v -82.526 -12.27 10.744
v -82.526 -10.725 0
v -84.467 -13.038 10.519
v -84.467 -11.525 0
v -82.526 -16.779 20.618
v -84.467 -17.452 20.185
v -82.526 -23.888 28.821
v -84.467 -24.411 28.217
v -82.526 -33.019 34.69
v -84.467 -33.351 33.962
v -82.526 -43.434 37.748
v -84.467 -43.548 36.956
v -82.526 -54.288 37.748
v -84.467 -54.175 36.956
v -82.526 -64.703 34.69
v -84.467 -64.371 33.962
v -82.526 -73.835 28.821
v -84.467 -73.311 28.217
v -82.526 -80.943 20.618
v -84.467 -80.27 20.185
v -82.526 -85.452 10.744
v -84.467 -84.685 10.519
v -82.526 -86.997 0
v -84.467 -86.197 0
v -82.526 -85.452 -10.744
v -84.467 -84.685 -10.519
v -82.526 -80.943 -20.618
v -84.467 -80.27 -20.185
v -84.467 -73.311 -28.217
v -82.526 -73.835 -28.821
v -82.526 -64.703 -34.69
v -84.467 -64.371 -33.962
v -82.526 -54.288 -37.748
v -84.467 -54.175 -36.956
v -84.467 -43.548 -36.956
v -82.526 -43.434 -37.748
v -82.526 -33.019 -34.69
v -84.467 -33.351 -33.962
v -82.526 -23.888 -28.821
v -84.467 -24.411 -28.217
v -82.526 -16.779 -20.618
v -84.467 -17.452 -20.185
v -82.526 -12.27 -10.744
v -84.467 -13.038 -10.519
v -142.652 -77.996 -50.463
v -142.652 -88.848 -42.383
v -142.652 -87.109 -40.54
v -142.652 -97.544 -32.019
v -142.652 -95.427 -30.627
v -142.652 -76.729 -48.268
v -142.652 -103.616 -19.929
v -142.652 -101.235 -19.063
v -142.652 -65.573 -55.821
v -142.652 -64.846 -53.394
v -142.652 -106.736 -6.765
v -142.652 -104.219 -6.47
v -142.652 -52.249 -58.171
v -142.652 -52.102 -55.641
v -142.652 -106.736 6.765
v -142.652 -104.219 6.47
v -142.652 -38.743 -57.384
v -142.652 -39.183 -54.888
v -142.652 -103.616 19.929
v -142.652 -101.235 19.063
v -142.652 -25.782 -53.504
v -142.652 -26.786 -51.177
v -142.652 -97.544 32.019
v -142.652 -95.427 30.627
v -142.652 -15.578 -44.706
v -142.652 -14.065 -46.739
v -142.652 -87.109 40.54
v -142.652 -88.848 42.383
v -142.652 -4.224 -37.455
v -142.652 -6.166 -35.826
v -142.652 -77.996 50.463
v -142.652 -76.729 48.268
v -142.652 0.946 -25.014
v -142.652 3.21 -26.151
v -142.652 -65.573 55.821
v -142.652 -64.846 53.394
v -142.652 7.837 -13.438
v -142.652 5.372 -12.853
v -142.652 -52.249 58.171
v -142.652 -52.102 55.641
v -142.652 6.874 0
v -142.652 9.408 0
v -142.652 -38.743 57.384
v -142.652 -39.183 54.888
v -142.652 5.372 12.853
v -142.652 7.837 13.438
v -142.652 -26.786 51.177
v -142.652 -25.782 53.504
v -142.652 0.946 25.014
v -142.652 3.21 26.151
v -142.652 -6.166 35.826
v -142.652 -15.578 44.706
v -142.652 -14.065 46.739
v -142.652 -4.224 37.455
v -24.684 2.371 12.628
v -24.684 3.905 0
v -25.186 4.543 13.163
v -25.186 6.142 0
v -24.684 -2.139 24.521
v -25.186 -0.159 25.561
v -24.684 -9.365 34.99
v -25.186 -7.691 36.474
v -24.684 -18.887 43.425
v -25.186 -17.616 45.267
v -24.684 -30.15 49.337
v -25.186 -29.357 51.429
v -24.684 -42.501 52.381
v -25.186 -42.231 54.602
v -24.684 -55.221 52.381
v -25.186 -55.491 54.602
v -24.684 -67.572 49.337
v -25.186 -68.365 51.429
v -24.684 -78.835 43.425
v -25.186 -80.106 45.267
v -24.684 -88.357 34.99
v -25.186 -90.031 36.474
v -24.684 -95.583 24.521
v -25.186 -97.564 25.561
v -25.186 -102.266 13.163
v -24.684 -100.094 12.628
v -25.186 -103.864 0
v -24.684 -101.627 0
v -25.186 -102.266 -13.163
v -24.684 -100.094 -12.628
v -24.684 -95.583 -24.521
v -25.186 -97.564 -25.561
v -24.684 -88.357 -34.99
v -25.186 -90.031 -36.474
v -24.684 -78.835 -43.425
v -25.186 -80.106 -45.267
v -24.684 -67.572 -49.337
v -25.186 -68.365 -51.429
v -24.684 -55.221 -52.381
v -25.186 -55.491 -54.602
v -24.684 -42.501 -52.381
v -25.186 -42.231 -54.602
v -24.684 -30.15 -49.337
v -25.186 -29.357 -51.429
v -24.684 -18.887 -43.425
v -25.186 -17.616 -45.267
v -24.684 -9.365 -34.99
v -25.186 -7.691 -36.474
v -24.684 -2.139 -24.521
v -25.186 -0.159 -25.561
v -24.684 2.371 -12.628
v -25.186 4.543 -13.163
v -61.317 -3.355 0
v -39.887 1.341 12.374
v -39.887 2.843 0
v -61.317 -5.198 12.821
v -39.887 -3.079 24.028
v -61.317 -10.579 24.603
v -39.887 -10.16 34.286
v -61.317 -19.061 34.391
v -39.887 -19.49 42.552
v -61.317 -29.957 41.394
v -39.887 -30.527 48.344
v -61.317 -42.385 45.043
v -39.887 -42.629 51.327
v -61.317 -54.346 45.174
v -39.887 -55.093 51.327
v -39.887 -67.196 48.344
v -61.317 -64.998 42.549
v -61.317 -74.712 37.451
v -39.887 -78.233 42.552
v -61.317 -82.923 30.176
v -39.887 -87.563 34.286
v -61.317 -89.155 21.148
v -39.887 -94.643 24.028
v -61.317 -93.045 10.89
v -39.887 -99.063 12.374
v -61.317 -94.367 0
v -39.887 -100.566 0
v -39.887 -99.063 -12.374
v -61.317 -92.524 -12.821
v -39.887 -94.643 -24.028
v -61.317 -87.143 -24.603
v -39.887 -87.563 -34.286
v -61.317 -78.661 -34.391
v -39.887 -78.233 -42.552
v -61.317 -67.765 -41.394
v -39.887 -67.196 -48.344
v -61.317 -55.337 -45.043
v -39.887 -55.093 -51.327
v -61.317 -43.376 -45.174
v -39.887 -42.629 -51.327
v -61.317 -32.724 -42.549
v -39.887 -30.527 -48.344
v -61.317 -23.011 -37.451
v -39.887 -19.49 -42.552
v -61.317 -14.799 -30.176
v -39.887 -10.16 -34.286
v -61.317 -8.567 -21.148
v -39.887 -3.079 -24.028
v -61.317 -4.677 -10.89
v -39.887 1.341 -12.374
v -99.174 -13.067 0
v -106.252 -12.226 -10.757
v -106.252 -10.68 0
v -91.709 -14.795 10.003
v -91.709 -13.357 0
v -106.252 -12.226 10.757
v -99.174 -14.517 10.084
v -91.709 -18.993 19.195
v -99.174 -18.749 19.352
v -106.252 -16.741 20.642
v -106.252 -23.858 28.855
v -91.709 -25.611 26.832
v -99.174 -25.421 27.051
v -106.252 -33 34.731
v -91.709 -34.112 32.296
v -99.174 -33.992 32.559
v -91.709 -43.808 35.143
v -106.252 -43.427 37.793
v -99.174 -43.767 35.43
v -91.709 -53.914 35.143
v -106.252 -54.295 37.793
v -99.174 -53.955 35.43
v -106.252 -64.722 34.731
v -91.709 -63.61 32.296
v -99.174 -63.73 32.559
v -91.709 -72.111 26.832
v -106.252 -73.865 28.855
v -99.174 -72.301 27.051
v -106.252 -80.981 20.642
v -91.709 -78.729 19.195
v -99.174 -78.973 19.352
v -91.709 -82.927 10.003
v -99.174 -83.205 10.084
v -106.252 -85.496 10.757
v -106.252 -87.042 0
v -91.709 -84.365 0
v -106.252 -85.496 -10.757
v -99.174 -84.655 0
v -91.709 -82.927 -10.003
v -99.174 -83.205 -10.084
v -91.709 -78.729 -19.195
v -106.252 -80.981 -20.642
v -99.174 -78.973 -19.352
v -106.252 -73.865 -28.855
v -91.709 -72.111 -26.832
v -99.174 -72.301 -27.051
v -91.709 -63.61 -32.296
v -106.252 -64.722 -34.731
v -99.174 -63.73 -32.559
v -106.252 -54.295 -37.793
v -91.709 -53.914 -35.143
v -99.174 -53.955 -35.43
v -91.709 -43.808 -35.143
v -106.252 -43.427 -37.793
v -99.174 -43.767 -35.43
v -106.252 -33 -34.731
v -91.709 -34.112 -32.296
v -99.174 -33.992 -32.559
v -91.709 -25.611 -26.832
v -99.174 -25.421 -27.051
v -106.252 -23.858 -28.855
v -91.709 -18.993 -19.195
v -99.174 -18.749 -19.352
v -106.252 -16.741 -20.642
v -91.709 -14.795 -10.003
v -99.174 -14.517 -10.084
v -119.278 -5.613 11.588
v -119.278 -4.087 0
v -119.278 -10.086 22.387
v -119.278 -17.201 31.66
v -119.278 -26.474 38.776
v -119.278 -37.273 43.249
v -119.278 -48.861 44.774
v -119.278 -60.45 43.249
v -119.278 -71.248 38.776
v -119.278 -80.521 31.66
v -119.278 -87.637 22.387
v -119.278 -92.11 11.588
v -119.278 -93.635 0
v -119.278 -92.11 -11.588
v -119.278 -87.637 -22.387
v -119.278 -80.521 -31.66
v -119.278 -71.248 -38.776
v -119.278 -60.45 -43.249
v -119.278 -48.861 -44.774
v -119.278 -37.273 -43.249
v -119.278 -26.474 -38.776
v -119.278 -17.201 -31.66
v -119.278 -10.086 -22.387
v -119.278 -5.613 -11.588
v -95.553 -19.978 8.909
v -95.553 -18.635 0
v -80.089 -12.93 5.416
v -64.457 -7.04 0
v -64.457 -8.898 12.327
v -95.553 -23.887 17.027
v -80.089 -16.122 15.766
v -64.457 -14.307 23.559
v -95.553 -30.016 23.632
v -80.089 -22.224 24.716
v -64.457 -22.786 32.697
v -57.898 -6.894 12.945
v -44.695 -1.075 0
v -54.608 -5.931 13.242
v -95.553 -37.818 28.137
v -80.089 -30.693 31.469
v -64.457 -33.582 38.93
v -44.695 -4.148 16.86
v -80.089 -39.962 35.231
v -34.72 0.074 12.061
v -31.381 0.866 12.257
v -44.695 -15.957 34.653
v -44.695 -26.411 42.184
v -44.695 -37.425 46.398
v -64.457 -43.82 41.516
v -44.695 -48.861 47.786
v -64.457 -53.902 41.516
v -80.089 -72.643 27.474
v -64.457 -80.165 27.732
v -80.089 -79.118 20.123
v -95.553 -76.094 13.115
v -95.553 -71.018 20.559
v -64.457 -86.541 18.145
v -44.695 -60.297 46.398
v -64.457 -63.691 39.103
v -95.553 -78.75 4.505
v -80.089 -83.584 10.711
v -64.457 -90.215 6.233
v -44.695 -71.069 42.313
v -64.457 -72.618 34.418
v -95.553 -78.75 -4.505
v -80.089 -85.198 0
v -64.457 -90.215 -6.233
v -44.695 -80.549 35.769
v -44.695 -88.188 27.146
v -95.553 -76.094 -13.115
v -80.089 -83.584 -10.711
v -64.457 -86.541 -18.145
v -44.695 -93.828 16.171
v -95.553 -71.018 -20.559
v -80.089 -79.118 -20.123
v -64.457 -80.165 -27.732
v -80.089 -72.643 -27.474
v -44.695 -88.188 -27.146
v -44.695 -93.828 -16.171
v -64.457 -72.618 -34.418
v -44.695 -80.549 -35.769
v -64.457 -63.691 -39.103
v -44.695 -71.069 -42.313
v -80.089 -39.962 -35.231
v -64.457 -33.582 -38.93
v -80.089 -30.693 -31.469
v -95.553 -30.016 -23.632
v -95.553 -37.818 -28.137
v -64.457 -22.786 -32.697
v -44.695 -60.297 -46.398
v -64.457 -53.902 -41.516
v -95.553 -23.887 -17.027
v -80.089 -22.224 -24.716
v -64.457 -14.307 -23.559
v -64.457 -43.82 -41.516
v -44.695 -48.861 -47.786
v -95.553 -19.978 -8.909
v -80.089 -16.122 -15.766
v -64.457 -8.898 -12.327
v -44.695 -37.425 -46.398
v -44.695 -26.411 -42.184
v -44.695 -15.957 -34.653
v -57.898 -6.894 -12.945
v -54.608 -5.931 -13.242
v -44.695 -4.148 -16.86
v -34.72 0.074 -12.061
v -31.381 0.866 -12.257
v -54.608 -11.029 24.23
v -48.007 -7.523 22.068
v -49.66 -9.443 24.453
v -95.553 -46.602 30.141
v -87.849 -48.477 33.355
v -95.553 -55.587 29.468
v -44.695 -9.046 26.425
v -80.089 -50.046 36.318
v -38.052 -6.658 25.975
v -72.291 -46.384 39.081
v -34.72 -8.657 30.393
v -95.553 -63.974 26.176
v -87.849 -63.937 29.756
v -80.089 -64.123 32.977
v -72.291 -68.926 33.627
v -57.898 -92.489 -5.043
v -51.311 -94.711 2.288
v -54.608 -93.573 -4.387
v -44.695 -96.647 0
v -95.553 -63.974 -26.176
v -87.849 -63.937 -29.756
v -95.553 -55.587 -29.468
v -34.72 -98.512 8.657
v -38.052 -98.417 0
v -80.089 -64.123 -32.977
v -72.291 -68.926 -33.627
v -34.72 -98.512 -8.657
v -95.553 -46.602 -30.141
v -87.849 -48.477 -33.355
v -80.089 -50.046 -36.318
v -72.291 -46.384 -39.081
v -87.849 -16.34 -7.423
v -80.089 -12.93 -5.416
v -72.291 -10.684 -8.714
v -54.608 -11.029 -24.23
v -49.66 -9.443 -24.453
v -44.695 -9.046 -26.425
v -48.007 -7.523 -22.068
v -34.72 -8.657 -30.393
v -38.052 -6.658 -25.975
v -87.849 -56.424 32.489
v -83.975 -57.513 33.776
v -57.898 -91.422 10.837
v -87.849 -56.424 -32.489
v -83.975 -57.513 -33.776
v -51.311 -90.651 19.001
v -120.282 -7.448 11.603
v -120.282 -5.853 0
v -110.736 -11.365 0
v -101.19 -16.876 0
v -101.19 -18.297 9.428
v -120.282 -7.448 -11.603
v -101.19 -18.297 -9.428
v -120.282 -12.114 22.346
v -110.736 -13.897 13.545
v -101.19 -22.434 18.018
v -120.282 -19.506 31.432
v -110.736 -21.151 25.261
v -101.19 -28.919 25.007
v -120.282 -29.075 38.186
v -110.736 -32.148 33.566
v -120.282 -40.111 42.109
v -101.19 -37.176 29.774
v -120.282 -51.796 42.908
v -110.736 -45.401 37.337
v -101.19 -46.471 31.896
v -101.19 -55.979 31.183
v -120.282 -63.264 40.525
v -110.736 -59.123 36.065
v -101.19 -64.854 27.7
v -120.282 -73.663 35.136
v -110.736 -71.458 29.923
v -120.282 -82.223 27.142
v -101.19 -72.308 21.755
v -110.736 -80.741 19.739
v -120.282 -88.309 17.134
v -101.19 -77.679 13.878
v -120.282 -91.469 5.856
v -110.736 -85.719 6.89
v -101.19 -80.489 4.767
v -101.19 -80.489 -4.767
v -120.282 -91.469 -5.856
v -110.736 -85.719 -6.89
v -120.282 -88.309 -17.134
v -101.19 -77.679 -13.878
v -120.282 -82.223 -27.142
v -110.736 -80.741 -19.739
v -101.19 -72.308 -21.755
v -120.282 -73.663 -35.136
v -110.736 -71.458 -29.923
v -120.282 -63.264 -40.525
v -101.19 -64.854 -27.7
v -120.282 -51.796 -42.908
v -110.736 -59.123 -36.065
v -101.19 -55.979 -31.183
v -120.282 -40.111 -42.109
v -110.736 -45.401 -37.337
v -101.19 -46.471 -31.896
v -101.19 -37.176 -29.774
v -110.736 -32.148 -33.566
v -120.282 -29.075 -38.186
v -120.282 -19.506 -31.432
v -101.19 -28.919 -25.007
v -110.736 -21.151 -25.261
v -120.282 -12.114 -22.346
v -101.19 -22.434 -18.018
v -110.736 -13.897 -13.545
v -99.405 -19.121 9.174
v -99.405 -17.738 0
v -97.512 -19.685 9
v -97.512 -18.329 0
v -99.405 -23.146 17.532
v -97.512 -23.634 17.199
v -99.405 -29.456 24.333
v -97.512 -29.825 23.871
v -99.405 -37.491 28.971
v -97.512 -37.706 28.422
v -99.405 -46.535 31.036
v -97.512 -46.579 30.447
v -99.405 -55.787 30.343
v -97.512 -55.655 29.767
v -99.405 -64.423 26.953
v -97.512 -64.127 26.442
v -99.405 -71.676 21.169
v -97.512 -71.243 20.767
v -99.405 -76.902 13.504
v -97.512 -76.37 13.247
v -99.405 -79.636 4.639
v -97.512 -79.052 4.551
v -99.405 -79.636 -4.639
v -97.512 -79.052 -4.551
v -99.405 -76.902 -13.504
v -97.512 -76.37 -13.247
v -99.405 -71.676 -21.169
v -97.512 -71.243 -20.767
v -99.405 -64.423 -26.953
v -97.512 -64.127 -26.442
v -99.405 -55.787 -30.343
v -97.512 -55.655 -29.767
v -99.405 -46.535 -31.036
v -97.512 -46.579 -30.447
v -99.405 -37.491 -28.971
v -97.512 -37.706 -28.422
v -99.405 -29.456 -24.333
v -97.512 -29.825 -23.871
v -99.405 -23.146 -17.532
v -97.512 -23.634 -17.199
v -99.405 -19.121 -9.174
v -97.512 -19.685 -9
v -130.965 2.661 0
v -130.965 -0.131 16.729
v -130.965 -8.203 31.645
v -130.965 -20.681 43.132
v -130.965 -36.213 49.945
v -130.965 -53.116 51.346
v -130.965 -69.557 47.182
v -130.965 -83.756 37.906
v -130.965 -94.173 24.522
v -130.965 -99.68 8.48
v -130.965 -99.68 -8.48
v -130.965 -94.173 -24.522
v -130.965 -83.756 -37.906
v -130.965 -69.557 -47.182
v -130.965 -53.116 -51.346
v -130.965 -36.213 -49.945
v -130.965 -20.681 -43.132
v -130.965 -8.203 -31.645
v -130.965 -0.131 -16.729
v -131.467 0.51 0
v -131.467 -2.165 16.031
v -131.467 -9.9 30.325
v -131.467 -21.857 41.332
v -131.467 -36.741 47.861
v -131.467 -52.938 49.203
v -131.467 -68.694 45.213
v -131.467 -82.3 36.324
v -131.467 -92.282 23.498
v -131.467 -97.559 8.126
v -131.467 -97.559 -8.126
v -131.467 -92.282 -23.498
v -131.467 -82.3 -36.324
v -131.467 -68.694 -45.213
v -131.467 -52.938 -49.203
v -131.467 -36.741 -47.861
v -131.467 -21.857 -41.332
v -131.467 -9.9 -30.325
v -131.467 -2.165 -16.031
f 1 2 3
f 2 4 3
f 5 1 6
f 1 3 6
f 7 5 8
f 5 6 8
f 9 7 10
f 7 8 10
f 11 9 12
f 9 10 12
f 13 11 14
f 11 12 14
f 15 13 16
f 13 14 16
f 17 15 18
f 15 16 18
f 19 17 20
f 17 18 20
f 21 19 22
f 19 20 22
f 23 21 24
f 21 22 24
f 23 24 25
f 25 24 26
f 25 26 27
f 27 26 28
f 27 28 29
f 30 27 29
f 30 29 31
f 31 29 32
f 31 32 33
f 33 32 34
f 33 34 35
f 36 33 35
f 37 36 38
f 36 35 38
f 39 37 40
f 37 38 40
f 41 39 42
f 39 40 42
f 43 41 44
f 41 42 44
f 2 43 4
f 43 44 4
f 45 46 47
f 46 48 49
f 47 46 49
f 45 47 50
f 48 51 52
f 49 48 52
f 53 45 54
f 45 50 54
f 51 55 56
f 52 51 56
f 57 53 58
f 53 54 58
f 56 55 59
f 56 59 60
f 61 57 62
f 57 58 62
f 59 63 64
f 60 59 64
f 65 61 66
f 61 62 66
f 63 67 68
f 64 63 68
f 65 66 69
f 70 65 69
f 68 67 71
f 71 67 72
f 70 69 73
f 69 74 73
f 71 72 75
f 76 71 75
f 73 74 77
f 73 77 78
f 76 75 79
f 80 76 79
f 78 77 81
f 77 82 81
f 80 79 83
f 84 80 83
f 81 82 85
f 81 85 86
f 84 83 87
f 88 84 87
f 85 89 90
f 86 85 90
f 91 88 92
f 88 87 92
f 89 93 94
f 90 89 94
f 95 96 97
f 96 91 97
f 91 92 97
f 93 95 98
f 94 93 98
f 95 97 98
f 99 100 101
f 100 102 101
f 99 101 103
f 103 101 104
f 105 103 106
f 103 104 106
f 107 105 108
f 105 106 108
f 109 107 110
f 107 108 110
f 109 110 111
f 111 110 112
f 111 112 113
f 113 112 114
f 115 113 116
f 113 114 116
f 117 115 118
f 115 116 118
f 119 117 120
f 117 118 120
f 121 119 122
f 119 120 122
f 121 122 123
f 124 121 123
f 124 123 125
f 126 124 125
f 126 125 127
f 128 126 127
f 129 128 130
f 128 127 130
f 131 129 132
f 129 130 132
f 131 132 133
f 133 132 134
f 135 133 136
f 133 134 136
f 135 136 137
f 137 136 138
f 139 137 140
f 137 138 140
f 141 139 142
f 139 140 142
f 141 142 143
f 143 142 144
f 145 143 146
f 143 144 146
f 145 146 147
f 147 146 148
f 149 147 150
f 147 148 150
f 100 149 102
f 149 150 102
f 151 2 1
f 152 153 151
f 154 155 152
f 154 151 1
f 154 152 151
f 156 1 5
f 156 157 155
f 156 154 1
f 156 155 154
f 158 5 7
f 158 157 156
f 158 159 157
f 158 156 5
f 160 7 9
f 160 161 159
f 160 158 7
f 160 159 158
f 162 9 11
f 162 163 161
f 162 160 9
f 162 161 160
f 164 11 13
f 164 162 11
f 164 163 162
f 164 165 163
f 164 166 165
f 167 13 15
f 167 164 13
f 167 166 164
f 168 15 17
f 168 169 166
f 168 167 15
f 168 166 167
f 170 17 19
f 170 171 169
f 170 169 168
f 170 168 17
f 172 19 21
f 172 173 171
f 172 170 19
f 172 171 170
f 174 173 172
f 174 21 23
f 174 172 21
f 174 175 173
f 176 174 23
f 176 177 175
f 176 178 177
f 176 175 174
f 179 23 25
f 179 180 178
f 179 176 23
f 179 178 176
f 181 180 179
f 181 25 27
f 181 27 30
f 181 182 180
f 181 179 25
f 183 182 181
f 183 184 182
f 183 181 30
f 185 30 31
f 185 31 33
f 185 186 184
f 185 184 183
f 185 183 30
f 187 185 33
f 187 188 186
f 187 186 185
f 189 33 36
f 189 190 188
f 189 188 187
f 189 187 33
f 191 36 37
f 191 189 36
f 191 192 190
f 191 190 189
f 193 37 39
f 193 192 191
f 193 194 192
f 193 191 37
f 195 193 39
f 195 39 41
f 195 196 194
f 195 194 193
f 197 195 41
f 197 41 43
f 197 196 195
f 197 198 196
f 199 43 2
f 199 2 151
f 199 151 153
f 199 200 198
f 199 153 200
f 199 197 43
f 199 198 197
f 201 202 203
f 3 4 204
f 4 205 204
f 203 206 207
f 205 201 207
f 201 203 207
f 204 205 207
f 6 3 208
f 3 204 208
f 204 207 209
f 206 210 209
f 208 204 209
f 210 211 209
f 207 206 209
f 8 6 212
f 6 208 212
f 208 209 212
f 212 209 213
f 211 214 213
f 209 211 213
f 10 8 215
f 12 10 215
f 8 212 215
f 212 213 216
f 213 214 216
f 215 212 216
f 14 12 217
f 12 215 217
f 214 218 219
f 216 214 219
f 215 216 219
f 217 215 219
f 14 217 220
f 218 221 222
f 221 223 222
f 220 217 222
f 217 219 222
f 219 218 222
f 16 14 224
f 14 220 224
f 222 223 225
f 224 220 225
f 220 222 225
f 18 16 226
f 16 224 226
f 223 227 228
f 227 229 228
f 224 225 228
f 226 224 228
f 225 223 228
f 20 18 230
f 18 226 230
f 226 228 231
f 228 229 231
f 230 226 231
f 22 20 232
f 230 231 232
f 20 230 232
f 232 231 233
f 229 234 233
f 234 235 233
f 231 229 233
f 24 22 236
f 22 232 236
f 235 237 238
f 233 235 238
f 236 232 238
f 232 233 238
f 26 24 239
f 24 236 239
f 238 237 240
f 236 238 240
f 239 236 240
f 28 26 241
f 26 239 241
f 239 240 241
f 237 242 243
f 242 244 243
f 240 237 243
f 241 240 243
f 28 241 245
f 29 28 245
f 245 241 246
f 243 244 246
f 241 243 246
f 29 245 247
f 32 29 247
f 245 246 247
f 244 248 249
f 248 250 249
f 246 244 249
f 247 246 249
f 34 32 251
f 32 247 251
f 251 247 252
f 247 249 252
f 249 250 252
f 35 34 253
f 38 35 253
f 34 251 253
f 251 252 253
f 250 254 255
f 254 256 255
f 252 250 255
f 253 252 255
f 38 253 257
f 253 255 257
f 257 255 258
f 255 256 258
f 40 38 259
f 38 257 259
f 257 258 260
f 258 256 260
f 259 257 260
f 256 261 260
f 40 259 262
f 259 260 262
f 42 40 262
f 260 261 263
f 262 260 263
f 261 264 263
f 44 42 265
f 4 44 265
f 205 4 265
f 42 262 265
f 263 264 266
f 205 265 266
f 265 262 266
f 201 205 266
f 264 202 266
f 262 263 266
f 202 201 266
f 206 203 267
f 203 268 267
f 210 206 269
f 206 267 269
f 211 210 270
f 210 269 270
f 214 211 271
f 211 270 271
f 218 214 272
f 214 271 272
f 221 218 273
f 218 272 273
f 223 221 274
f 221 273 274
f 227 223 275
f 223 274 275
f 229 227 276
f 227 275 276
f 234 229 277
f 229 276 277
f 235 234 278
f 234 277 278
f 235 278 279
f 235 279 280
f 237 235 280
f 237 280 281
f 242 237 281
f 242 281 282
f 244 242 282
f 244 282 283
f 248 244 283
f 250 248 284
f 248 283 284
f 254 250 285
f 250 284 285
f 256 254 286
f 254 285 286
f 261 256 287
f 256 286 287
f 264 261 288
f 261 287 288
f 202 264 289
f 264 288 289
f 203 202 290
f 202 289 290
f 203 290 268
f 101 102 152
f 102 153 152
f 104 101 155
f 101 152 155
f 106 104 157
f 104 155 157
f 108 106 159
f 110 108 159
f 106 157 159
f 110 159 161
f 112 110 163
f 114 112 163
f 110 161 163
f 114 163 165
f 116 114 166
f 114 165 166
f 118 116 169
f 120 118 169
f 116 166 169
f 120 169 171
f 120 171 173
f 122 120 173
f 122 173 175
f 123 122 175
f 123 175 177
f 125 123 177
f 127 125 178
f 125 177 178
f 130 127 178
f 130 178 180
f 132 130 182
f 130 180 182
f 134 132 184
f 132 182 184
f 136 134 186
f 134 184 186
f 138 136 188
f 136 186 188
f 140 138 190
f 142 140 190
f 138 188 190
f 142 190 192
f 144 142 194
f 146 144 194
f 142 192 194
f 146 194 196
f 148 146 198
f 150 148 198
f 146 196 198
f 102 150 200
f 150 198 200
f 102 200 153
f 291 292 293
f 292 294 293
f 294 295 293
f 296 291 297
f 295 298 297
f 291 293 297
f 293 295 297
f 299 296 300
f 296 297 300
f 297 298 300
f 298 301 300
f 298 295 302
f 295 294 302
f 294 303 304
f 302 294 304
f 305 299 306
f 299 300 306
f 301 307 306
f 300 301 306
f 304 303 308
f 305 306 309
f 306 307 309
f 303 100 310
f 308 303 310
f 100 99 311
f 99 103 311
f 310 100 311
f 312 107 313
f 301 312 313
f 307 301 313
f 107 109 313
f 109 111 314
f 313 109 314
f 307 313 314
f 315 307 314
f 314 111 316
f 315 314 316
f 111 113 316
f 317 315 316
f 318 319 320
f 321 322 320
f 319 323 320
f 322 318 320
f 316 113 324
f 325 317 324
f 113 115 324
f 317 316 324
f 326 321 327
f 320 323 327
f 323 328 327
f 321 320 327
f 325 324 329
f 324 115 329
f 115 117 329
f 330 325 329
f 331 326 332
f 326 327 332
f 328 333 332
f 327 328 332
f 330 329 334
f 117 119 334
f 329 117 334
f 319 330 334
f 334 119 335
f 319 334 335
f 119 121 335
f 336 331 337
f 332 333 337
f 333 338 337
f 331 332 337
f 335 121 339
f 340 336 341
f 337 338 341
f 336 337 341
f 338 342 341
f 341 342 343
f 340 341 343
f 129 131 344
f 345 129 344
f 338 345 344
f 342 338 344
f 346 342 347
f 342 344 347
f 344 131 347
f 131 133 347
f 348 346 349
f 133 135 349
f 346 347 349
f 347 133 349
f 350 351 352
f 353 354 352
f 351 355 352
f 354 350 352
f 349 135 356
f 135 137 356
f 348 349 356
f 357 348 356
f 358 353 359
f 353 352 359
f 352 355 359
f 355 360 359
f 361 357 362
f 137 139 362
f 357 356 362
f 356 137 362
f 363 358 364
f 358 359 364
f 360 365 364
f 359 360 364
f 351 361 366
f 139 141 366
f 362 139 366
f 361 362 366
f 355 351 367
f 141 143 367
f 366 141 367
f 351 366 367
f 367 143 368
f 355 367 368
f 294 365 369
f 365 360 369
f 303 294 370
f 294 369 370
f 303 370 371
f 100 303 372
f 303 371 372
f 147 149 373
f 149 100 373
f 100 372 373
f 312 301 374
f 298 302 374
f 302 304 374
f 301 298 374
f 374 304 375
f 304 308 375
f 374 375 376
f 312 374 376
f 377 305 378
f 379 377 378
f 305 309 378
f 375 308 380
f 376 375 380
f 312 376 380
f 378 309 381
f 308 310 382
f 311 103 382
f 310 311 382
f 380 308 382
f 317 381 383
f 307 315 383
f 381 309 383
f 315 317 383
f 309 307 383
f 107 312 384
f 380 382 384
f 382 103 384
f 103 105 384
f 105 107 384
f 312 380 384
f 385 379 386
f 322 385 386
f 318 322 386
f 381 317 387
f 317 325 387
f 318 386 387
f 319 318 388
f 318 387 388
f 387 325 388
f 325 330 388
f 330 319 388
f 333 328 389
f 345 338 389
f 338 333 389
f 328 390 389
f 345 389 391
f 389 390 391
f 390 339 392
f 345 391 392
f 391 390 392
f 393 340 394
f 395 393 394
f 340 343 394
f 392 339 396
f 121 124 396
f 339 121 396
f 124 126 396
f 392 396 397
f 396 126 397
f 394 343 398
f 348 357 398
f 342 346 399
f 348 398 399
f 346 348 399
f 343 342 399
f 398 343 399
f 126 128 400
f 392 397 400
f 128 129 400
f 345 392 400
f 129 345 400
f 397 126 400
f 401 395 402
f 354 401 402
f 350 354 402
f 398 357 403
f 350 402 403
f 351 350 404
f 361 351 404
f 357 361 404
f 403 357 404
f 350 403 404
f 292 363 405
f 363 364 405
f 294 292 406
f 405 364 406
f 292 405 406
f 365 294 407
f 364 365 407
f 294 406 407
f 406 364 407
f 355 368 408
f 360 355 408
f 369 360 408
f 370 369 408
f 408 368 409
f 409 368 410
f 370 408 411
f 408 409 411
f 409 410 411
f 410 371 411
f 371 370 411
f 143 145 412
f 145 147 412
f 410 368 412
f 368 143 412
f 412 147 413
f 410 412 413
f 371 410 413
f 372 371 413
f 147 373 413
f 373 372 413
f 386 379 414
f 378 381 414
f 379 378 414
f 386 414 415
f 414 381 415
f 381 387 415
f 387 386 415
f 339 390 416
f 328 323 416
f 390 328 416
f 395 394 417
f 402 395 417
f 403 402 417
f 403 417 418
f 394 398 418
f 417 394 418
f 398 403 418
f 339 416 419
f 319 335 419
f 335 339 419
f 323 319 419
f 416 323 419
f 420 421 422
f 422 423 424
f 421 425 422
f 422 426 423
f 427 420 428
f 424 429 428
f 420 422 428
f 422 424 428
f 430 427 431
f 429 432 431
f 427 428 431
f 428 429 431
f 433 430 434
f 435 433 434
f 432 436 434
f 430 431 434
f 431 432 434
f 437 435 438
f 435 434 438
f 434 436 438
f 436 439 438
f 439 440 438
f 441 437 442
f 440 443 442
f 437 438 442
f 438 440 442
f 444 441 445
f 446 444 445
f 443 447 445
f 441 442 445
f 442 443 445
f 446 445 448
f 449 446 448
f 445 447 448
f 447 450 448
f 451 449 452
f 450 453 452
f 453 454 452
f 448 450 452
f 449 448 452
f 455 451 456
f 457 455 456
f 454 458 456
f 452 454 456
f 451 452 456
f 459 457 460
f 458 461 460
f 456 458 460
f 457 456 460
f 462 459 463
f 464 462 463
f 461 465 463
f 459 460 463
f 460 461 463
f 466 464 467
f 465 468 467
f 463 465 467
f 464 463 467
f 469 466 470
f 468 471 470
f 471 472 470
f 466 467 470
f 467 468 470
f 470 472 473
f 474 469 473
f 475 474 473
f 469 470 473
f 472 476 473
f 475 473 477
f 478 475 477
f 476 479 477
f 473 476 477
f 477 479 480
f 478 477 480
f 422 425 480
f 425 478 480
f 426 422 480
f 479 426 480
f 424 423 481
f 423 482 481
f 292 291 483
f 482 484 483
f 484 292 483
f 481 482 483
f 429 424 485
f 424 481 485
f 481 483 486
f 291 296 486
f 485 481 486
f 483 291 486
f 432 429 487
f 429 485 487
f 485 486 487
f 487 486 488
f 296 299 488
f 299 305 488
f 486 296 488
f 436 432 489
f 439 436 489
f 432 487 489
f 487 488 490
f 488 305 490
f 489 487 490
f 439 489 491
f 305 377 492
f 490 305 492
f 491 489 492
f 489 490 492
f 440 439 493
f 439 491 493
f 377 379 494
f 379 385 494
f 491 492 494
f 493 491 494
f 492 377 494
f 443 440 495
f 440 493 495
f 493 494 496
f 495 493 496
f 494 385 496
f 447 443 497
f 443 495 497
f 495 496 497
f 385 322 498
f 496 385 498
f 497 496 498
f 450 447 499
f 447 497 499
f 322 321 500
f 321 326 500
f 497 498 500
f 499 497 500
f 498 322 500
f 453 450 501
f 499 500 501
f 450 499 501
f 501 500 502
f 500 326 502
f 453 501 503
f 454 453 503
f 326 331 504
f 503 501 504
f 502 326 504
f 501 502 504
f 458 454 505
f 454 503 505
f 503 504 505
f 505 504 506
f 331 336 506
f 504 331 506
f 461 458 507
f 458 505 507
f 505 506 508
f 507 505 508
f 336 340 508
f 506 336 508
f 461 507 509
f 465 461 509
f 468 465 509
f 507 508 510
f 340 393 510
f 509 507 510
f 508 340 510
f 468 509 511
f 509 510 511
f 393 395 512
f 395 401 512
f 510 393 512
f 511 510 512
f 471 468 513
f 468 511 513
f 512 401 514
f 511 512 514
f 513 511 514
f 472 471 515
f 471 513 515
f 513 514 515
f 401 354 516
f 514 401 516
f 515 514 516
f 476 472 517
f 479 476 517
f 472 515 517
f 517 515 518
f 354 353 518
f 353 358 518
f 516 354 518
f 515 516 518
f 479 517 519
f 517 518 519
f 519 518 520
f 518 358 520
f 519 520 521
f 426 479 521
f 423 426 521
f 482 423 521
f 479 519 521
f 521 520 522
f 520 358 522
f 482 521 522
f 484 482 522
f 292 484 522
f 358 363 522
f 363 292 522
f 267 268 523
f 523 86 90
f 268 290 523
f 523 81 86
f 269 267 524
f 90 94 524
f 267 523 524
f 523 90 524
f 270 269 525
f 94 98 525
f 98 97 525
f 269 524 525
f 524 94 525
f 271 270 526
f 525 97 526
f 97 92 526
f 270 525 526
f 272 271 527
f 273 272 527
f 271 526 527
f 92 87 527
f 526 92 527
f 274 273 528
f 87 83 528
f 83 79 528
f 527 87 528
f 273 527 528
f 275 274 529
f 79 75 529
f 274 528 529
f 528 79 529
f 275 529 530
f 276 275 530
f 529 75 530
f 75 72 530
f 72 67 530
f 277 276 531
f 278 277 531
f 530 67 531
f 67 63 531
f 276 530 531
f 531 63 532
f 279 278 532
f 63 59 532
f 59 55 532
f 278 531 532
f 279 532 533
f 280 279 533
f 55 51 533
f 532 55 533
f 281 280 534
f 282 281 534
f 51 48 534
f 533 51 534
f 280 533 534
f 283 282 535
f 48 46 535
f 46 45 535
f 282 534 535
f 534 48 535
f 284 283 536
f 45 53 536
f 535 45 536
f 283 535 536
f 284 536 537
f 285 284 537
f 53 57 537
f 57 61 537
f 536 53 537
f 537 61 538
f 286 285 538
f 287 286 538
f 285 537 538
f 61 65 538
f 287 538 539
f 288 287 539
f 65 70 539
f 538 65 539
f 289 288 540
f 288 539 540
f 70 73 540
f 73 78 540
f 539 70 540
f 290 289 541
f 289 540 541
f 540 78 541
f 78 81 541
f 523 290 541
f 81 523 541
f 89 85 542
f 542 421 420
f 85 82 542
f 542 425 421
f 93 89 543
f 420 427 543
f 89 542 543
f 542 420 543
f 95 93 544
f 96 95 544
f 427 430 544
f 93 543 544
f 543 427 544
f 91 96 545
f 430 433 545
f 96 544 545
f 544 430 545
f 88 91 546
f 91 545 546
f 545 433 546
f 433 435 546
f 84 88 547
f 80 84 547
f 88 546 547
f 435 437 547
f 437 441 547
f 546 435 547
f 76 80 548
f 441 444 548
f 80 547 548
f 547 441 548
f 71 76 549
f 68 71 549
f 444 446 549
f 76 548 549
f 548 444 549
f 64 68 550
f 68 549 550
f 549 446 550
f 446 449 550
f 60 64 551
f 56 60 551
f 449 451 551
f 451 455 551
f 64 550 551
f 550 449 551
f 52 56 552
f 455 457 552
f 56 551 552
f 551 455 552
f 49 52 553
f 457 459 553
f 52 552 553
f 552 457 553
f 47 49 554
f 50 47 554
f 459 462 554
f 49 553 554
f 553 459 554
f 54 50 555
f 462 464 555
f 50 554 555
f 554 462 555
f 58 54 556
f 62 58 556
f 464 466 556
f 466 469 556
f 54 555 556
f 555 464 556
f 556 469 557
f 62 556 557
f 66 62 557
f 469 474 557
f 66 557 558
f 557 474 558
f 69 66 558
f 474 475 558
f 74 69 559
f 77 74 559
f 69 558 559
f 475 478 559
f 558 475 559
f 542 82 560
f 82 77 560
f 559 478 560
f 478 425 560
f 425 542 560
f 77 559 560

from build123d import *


with BuildPart() as part:
    # Sketch1 → Revolve1 (revolve)
    with BuildSketch(Plane.XY):
        with BuildLine():
            Line((-120.282432541, -5.85308291), (-101.189934492, -16.876139995))
            ThreePointArc((-101.189934492, -16.876139995), (-98.469148075, -18.068527983), (-95.5530911, -18.63516681))
            add(Edge.make_bspline(
                [(-95.5530911, -18.63516681), (-89.800483576, -16.232100699), (-78.169339758, -11.667500611), (-54.691503651, -3.625702949), (-36.76219579, 1.213807703), (-24.683568515, 3.904530155)],
                knots=[0.017508698, 0.017508698, 0.017508698, 0.017508698, 0.263131524, 0.508754349, 1, 1, 1, 1], degree=3))
            Line((-24.683568515, 3.904530155), (-25.185533597, 6.141751328))
            Line((-25.185533597, 6.141751328), (-39.886573133, 2.843280613))
            add(Edge.make_bspline(
                [(-82.526490105, -10.725345919), (-75.535771876, -8.087826575), (-61.392047387, -3.171402737), (-47.094689271, 0.963982134), (-39.886573133, 2.843280613)],
                knots=[0.214165291, 0.214165291, 0.214165291, 0.214165291, 0.507948806, 0.801732321, 0.801732321, 0.801732321, 0.801732321], degree=3))
            Line((-82.526490105, -10.725345919), (-84.466720187, -11.525146883))
            ThreePointArc((-84.466720187, -11.525146883), (-95.45162035, -13.479924278), (-106.252034716, -10.679882178))
            Line((-106.252034716, -10.679882178), (-119.277599097, -4.086975331))
            Line((-119.277599097, -4.086975331), (-142.651647032, 9.408035329))
            Line((-142.651647032, 9.408035329), (-142.651647032, 6.873964468))
            Line((-142.651647032, 6.873964468), (-120.282432541, -5.85308291))
        make_face()
    revolve(axis=Axis((-89.93477047, -48.86116681, 0), (1, 0, 0)))


solid = part.part
